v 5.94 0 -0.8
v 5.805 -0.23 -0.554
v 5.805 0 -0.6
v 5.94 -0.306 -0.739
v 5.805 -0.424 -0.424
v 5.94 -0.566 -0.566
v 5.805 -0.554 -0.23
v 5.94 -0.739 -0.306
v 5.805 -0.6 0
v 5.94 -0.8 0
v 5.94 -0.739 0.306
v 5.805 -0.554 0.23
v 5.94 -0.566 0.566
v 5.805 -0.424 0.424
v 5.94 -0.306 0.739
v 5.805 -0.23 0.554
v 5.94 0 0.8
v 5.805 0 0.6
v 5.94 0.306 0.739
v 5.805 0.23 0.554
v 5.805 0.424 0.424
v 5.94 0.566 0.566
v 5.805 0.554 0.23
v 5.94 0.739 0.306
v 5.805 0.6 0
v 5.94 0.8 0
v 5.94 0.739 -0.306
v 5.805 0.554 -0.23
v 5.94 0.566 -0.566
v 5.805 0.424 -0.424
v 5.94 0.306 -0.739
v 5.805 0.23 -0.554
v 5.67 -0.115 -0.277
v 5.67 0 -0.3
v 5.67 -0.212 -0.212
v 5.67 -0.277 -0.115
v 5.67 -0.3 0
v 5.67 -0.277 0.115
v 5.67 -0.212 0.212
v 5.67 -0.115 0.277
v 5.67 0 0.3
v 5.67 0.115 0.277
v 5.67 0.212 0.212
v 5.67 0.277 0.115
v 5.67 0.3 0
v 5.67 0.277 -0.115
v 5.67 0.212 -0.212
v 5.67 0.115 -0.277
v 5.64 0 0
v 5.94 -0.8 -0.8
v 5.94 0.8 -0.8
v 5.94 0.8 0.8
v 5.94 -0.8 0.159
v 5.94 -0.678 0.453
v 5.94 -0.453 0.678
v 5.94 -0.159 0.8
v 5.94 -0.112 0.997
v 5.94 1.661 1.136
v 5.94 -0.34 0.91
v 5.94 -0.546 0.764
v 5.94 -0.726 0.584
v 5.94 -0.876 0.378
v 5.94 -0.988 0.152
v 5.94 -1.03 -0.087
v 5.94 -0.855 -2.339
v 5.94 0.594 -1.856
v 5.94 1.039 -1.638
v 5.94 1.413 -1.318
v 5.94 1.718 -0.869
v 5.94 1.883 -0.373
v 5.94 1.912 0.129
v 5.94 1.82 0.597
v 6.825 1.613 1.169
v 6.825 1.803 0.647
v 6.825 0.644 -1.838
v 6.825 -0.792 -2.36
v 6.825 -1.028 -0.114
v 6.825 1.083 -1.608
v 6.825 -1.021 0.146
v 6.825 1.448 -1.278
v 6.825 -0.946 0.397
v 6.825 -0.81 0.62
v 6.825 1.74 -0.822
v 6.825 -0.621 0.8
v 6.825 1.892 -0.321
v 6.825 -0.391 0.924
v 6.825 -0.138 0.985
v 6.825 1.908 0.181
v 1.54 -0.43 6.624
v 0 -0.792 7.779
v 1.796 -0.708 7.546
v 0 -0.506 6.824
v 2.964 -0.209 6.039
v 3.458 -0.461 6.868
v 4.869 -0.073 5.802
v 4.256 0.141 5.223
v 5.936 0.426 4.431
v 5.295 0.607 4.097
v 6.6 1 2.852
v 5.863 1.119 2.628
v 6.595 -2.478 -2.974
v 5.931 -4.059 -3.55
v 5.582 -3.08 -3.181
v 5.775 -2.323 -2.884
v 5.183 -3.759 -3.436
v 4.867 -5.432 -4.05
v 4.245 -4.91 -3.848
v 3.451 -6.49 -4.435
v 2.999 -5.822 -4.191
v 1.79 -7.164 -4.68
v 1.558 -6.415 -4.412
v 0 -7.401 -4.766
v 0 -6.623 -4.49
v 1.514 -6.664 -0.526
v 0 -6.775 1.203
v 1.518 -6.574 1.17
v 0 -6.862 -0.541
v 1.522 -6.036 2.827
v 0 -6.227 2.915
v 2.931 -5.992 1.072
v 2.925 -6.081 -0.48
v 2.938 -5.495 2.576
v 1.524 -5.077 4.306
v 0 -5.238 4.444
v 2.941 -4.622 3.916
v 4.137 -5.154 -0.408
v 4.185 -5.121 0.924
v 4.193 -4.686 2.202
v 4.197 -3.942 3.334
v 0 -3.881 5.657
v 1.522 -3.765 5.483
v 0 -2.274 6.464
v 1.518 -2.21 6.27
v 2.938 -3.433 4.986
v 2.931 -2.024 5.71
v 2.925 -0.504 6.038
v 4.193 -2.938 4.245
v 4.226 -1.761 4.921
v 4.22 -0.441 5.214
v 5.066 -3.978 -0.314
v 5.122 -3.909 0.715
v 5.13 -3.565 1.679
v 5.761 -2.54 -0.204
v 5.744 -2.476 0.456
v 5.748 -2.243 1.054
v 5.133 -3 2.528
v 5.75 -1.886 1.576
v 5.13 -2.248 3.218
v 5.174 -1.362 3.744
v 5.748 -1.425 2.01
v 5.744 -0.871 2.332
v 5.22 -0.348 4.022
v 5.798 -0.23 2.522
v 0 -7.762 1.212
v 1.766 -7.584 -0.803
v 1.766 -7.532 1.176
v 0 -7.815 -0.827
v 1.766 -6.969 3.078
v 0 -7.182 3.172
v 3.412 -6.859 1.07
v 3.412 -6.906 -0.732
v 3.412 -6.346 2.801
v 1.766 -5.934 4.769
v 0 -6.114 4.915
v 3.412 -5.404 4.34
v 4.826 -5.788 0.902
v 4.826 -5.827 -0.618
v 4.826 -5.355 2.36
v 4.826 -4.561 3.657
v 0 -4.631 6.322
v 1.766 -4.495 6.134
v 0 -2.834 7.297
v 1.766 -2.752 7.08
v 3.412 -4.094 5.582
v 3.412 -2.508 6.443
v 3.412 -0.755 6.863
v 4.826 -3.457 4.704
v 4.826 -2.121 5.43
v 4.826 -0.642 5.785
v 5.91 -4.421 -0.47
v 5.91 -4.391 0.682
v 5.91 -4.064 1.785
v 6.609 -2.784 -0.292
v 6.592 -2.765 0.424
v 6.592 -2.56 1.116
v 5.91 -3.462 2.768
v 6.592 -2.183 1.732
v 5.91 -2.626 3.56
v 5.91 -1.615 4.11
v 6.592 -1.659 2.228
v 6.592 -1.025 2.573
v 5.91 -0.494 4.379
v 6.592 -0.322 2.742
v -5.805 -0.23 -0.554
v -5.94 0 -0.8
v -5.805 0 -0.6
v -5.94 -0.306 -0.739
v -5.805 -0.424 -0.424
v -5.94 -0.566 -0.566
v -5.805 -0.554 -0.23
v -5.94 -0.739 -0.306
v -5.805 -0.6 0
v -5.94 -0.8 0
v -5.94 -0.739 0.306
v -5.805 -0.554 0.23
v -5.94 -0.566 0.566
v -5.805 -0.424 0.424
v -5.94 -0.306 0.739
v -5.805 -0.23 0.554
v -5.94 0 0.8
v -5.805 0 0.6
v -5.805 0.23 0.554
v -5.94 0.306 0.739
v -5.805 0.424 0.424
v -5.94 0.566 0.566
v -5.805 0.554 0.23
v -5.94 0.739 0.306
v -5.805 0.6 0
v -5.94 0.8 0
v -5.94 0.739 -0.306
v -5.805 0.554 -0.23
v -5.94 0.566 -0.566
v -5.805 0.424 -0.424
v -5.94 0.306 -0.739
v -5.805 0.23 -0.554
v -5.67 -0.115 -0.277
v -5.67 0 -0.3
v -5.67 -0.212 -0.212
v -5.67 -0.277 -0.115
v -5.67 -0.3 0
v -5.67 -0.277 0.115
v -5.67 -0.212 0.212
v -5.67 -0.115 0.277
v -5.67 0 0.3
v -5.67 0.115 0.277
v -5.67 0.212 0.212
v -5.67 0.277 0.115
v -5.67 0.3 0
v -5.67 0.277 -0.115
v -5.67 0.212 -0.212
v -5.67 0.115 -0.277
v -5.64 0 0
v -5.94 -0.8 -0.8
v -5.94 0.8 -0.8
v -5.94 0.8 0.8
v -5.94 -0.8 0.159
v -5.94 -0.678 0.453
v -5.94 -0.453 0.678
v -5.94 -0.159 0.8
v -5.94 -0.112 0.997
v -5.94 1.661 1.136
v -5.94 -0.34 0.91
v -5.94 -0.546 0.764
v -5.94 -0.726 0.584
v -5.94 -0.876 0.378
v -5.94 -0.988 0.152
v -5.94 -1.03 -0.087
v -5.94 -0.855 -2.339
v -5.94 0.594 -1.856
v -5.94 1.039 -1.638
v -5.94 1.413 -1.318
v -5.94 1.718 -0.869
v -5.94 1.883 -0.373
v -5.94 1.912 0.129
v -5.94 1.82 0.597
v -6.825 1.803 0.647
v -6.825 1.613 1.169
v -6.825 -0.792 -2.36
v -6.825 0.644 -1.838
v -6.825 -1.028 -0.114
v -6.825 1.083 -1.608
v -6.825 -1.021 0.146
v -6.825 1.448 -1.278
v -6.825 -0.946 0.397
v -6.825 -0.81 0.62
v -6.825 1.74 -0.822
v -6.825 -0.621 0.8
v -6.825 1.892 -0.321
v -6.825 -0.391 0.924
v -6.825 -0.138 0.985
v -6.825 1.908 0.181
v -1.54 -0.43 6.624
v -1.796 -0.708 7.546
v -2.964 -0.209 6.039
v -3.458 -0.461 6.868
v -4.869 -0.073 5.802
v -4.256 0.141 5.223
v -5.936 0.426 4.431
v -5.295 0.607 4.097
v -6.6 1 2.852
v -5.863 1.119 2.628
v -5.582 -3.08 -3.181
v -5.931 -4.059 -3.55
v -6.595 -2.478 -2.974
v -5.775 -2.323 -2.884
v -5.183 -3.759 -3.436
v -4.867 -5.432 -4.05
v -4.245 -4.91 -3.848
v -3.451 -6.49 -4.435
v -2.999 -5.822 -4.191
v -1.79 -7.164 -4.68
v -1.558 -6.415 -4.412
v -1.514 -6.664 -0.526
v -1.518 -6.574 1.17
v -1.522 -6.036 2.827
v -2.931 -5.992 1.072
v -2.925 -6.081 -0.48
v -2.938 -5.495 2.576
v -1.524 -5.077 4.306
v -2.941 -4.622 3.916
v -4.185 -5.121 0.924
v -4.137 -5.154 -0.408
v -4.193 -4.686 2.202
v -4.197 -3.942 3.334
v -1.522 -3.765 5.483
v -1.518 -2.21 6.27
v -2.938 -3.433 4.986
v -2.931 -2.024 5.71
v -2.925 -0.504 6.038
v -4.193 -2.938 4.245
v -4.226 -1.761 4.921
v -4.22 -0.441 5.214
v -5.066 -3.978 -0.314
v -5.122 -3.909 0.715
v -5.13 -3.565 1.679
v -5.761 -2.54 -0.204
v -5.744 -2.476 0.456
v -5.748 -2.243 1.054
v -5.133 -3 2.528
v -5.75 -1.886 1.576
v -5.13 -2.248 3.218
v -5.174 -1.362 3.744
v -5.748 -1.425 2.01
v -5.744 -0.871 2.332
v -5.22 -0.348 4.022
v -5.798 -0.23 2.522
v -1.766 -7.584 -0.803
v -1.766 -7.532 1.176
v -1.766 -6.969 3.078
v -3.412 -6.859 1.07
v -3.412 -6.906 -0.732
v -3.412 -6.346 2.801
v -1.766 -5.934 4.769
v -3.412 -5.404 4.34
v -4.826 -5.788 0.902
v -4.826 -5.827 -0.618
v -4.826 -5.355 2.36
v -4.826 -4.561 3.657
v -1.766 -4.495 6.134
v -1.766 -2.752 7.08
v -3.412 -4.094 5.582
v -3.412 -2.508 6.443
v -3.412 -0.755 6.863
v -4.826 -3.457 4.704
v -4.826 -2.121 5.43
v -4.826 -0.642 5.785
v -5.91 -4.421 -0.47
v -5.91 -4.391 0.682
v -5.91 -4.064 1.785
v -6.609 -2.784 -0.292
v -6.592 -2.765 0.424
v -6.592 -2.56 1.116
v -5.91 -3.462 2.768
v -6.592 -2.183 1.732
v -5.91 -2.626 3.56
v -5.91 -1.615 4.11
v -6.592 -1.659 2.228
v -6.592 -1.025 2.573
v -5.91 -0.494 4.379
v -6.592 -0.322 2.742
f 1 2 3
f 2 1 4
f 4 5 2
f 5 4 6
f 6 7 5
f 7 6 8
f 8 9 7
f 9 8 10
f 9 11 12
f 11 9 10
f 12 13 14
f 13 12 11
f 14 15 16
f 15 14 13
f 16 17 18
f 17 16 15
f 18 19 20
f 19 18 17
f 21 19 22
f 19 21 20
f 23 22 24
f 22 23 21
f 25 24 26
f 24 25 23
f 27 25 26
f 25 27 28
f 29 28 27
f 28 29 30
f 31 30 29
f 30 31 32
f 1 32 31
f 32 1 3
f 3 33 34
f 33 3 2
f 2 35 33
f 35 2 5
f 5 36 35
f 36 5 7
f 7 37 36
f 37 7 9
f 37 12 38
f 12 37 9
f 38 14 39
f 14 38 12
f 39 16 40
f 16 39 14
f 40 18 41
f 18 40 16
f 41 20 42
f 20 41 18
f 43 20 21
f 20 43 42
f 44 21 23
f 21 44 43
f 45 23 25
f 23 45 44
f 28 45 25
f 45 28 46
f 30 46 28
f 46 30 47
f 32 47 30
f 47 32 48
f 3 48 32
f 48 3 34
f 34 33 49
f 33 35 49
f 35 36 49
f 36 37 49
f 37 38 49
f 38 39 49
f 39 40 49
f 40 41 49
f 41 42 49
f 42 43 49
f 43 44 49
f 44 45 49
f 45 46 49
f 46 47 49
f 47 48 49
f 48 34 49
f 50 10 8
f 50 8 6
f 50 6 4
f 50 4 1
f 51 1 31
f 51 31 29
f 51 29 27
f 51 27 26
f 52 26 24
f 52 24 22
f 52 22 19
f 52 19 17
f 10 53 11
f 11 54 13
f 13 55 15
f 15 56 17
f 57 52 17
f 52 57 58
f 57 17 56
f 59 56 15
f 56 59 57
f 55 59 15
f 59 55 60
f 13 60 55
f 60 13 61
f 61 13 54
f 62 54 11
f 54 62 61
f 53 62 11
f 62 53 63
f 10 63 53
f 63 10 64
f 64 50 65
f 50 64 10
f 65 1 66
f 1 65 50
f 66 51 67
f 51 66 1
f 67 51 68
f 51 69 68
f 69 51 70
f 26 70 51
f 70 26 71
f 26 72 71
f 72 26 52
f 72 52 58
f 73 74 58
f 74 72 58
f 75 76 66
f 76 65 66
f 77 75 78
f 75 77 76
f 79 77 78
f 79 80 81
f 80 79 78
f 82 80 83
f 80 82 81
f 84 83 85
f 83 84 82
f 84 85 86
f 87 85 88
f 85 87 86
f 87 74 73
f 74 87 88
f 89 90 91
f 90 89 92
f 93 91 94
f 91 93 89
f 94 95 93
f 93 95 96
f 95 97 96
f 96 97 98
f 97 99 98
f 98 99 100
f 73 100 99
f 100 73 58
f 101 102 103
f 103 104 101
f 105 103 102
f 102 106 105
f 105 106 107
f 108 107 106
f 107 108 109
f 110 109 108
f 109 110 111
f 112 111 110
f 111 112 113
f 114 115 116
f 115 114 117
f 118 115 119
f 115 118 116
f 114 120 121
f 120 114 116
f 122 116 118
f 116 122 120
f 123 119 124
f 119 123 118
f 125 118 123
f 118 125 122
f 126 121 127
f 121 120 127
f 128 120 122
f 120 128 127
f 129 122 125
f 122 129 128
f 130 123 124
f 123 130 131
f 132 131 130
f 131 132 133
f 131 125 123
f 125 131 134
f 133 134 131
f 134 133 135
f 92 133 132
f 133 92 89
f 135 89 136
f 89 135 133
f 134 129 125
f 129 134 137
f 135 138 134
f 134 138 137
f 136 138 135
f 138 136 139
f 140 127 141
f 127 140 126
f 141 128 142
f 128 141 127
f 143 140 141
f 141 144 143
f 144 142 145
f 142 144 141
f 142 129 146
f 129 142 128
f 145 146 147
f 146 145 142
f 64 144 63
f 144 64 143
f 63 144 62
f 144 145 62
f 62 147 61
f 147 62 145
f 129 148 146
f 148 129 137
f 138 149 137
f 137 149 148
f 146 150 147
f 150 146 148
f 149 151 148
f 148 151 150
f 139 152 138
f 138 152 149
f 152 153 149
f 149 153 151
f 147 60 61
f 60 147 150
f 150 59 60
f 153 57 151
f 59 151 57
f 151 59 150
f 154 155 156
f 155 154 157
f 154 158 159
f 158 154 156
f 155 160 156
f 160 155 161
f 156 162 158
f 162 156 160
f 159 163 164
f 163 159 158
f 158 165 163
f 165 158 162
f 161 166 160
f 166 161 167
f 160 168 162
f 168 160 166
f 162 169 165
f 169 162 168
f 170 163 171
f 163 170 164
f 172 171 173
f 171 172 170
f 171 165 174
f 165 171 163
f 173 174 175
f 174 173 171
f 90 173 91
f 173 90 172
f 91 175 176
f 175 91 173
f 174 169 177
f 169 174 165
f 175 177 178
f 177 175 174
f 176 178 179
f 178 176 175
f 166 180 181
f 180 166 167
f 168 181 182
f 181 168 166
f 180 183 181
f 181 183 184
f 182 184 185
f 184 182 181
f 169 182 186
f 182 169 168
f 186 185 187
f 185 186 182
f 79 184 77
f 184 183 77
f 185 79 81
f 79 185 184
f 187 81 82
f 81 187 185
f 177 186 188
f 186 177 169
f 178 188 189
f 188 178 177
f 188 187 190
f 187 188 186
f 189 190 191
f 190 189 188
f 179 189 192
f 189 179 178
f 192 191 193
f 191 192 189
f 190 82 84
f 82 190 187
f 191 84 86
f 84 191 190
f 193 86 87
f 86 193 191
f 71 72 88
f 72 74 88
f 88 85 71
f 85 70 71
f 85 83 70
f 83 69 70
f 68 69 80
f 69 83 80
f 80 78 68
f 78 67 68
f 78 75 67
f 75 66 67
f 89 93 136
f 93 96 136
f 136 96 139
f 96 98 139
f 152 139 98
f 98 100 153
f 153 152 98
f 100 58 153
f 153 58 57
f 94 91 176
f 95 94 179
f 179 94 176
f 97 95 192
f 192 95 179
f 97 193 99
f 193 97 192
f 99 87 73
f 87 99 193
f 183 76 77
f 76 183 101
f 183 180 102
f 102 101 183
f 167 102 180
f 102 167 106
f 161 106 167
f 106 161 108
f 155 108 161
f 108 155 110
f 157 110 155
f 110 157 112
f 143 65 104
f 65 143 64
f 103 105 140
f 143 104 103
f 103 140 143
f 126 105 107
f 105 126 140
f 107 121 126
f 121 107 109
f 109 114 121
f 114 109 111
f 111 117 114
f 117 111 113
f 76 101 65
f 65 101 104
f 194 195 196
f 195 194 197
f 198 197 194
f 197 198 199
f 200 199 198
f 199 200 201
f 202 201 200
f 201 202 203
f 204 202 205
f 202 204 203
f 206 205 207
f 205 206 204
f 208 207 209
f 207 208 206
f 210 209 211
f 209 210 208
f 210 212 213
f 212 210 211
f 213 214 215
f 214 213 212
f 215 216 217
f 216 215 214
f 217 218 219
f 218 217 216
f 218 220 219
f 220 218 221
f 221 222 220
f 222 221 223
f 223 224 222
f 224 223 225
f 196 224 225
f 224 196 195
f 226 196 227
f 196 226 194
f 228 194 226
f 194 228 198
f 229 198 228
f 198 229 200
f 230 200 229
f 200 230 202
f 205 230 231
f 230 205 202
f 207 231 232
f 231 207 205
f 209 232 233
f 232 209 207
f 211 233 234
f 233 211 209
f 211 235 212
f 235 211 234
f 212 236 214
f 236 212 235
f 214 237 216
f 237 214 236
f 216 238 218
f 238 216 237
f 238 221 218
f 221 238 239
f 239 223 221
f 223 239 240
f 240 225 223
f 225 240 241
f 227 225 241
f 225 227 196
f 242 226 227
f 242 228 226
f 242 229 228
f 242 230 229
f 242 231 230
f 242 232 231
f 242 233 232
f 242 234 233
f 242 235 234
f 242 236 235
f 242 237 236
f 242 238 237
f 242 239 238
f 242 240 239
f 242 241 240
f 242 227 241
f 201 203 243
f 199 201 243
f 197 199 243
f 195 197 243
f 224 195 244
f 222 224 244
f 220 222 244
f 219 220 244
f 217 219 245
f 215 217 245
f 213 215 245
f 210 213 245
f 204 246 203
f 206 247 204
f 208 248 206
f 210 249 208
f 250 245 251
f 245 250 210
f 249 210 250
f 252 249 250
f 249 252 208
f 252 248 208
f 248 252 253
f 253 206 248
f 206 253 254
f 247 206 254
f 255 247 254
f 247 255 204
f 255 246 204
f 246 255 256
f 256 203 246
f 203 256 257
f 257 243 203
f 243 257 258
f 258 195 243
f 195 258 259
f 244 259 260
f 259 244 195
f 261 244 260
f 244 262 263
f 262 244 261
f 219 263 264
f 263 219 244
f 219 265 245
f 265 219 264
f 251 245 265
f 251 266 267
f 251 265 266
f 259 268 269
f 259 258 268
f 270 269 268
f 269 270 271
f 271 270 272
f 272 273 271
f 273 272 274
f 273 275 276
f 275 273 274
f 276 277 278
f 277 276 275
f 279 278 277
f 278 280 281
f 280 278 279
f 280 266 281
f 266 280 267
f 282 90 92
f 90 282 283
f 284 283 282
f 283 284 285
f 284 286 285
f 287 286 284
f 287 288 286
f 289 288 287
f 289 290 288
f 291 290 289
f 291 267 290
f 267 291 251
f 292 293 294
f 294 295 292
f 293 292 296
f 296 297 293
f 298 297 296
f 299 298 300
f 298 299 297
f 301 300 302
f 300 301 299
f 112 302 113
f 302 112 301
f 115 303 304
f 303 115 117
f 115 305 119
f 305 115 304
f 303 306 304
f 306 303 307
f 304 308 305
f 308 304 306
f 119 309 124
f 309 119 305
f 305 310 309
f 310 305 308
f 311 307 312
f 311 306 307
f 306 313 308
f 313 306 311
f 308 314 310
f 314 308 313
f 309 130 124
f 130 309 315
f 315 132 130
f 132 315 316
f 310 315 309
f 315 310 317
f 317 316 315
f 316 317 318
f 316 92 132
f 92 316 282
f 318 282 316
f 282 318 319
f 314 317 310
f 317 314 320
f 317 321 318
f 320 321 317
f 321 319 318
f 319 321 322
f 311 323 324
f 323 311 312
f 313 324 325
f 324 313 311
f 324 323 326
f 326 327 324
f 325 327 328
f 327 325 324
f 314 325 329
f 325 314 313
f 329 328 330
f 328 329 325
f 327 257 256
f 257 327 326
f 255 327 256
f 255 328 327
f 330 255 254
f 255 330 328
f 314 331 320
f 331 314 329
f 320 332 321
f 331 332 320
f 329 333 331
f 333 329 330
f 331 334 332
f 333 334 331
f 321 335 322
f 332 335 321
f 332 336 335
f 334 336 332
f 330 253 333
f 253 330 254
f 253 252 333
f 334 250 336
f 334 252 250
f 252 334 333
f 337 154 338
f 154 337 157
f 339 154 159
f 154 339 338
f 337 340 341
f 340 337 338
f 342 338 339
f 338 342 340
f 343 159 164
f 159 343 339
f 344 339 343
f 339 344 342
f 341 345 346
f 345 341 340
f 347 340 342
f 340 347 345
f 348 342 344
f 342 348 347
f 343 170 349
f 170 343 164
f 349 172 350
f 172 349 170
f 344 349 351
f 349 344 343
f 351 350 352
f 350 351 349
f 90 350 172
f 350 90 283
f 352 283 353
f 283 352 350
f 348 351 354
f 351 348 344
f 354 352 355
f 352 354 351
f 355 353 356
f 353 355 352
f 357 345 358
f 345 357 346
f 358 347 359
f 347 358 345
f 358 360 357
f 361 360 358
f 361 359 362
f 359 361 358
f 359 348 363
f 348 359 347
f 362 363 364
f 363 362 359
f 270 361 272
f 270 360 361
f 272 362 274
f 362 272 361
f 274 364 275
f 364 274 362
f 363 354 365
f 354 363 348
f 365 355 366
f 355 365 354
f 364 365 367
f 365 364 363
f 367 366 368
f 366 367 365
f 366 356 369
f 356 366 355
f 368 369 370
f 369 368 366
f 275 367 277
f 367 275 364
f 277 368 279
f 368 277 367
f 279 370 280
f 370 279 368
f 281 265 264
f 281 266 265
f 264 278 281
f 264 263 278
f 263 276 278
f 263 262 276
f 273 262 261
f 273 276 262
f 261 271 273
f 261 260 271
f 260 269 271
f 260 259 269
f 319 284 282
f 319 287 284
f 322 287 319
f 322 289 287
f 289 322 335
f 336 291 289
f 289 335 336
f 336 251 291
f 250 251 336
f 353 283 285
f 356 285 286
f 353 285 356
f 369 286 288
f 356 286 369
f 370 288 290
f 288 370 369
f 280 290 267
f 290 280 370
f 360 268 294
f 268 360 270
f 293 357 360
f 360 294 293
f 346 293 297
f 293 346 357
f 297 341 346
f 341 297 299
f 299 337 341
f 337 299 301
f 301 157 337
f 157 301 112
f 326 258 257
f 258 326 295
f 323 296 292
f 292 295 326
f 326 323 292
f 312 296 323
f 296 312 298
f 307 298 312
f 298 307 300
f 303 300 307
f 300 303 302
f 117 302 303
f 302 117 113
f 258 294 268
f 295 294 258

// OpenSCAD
use <../lib.scad>
use <s/71016s01.scad>
function ldraw_lib__71016() = [
// 0 Minifig Helmet Visor Space
// 0 Name: 71016.dat
// 0 Author: Magnus Forsberg [MagFors]
// 0 !LDRAW_ORG Part UPDATE 2024-07
// 0 !LICENSE Licensed under CC BY 4.0 : see CAreadme.txt
// 
// 0 !HELP Place at y= 8, z= 0.7 on helmet 30124b
// 0 !HELP partnumber 23318 is the Chrome Blue plated version of this design
// 
// 0 BFC CERTIFY CCW
  [0,"BFC","CERTIFY"],
  [0,"BFC","CCW"],
// 
// 0 !CATEGORY Minifig Headwear
// 0 !KEYWORDS Apollo, astronaut, Dome, Launch Command, space port, Space Shuttle
// 
// 0 !HISTORY 2015-11-03 {LEGO Digital Designer} Original part shape
// 0 !HISTORY 2024-07-24 [MagFors] File preparation for LDraw Parts Tracker
// 0 !HISTORY 2024-08-26 [OrionP] Official Update 2024-07
// 
// 1 16 0 0 0 1 0 0 0 1 0 0 0 1 s\71016s01.dat
  [1,16,0,0,0,1,0,0,0,1,0,0,0,1, ldraw_lib__s__71016s01()],
// 1 16 0 0 0 -1 0 0 0 1 0 0 0 1 s\71016s01.dat
  [1,16,0,0,0,-1,0,0,0,1,0,0,0,1, ldraw_lib__s__71016s01()],
// 5 24 14.352 .511 -6.349 12.665 .785 -9.865 12.8058 -1.7867 -9.7718 14.362 7.213 -5.754
  [5,24,14.352,.511,-6.349,12.665,.785,-9.865,12.8058,-1.7867,-9.7718,14.362,7.213,-5.754],
// 5 24 0 -17.061 -1.266 0 -19.447 -1.981 -4.489 -18.865 -1.77 4.489 -18.865 -1.77
  [5,24,0,-17.061,-1.266,0,-19.447,-1.981,-4.489,-18.865,-1.77,4.489,-18.865,-1.77],
// 5 24 0 11.916 -18.503 0 11.225 -16.387 3.856 11.03 -15.871 -3.856 11.03 -15.871
  [5,24,0,11.916,-18.503,0,11.225,-16.387,3.856,11.03,-15.871,-3.856,11.03,-15.871],
// 5 24 0 -7.93 -17.955 0 -3.029 -19.405 4.416 -2.94 -18.831 -4.416 -2.94 -18.831
  [5,24,0,-7.93,-17.955,0,-3.029,-19.405,4.416,-2.94,-18.831,-4.416,-2.94,-18.831],
// 5 24 0 -12.288 -15.286 0 -7.93 -17.955 -4.416 -7.694 -17.423 4.416 -7.694 -17.423
  [5,24,0,-12.288,-15.286,0,-7.93,-17.955,-4.416,-7.694,-17.423,4.416,-7.694,-17.423],
// 5 24 0 2.068 -19.538 0 11.916 -18.503 -4.475 11.7 -17.91 4.475 11.7 -17.91
  [5,24,0,2.068,-19.538,0,11.916,-18.503,-4.475,11.7,-17.91,4.475,11.7,-17.91],
// 5 24 0 11.225 -16.387 0 1.353 -17.156 3.785 1.314 -16.659 -3.785 1.314 -16.659
  [5,24,0,11.225,-16.387,0,1.353,-17.156,3.785,1.314,-16.659,-3.785,1.314,-16.659],
// 5 24 0 -3.007 -16.937 0 -7.288 -15.568 -3.806 -7.068 -15.091 3.806 -7.068 -15.091
  [5,24,0,-3.007,-16.937,0,-7.288,-15.568,-3.806,-7.068,-15.091,3.806,-7.068,-15.091],
// 5 24 0 -19.447 -1.981 0 -18.243 -7.086 4.416 -17.699 -6.879 -4.416 -17.699 -6.879
  [5,24,0,-19.447,-1.981,0,-18.243,-7.086,4.416,-17.699,-6.879,-4.416,-17.699,-6.879],
// 5 24 0 -7.288 -15.568 0 -11.109 -13.096 -3.81 -10.764 -12.693 3.81 -10.764 -12.693
  [5,24,0,-7.288,-15.568,0,-11.109,-13.096,-3.81,-10.764,-12.693,3.81,-10.764,-12.693],
// 5 24 0 -16.159 -5.686 0 -17.061 -1.266 -3.849 -16.559 -1.074 3.849 -16.559 -1.074
  [5,24,0,-16.159,-5.686,0,-17.061,-1.266,-3.849,-16.559,-1.074,3.849,-16.559,-1.074],
// 5 24 0 1.353 -17.156 0 -3.007 -16.937 -3.794 -2.924 -16.434 3.794 -2.924 -16.434
  [5,24,0,1.353,-17.156,0,-3.007,-16.937,-3.794,-2.924,-16.434,3.794,-2.924,-16.434],
// 5 24 0 -18.243 -7.086 0 -15.805 -11.578 4.416 -15.334 -11.237 -4.416 -15.334 -11.237
  [5,24,0,-18.243,-7.086,0,-15.805,-11.578,4.416,-15.334,-11.237,-4.416,-15.334,-11.237],
// 5 24 0 -15.805 -11.578 0 -12.288 -15.286 -4.416 -11.922 -14.834 4.416 -11.922 -14.834
  [5,24,0,-15.805,-11.578,0,-12.288,-15.286,-4.416,-11.922,-14.834,4.416,-11.922,-14.834],
// 5 24 -14.352 .511 -6.349 -12.665 .785 -9.865 -12.8058 -1.7867 -9.7718 -14.362 7.213 -5.754
  [5,24,-14.352,.511,-6.349,-12.665,.785,-9.865,-12.8058,-1.7867,-9.7718,-14.362,7.213,-5.754],
// 5 24 0 -3.029 -19.405 0 2.068 -19.538 4.416 2.007 -18.96 -4.416 2.007 -18.96
  [5,24,0,-3.029,-19.405,0,2.068,-19.538,4.416,2.007,-18.96,-4.416,2.007,-18.96],
// 5 24 0 -11.109 -13.096 0 -14.143 -9.703 3.806 -13.707 -9.412 -3.806 -13.707 -9.412
  [5,24,0,-11.109,-13.096,0,-14.143,-9.703,3.806,-13.707,-9.412,-3.806,-13.707,-9.412],
// 5 24 0 -14.143 -9.703 0 -16.159 -5.686 3.794 -15.675 -5.526 -3.794 -15.675 -5.526
  [5,24,0,-14.143,-9.703,0,-16.159,-5.686,3.794,-15.675,-5.526,-3.794,-15.675,-5.526],
];
module ldraw_lib__71016(step=0, col=false, unit=2/5, alt=false, line=0.2, solid=!$preview)
    makepoly(ldraw_lib__71016(), step=step, col=col, unit=unit, alt=alt, line=line, solid=solid);
ldraw_lib__71016(line=0.2);
